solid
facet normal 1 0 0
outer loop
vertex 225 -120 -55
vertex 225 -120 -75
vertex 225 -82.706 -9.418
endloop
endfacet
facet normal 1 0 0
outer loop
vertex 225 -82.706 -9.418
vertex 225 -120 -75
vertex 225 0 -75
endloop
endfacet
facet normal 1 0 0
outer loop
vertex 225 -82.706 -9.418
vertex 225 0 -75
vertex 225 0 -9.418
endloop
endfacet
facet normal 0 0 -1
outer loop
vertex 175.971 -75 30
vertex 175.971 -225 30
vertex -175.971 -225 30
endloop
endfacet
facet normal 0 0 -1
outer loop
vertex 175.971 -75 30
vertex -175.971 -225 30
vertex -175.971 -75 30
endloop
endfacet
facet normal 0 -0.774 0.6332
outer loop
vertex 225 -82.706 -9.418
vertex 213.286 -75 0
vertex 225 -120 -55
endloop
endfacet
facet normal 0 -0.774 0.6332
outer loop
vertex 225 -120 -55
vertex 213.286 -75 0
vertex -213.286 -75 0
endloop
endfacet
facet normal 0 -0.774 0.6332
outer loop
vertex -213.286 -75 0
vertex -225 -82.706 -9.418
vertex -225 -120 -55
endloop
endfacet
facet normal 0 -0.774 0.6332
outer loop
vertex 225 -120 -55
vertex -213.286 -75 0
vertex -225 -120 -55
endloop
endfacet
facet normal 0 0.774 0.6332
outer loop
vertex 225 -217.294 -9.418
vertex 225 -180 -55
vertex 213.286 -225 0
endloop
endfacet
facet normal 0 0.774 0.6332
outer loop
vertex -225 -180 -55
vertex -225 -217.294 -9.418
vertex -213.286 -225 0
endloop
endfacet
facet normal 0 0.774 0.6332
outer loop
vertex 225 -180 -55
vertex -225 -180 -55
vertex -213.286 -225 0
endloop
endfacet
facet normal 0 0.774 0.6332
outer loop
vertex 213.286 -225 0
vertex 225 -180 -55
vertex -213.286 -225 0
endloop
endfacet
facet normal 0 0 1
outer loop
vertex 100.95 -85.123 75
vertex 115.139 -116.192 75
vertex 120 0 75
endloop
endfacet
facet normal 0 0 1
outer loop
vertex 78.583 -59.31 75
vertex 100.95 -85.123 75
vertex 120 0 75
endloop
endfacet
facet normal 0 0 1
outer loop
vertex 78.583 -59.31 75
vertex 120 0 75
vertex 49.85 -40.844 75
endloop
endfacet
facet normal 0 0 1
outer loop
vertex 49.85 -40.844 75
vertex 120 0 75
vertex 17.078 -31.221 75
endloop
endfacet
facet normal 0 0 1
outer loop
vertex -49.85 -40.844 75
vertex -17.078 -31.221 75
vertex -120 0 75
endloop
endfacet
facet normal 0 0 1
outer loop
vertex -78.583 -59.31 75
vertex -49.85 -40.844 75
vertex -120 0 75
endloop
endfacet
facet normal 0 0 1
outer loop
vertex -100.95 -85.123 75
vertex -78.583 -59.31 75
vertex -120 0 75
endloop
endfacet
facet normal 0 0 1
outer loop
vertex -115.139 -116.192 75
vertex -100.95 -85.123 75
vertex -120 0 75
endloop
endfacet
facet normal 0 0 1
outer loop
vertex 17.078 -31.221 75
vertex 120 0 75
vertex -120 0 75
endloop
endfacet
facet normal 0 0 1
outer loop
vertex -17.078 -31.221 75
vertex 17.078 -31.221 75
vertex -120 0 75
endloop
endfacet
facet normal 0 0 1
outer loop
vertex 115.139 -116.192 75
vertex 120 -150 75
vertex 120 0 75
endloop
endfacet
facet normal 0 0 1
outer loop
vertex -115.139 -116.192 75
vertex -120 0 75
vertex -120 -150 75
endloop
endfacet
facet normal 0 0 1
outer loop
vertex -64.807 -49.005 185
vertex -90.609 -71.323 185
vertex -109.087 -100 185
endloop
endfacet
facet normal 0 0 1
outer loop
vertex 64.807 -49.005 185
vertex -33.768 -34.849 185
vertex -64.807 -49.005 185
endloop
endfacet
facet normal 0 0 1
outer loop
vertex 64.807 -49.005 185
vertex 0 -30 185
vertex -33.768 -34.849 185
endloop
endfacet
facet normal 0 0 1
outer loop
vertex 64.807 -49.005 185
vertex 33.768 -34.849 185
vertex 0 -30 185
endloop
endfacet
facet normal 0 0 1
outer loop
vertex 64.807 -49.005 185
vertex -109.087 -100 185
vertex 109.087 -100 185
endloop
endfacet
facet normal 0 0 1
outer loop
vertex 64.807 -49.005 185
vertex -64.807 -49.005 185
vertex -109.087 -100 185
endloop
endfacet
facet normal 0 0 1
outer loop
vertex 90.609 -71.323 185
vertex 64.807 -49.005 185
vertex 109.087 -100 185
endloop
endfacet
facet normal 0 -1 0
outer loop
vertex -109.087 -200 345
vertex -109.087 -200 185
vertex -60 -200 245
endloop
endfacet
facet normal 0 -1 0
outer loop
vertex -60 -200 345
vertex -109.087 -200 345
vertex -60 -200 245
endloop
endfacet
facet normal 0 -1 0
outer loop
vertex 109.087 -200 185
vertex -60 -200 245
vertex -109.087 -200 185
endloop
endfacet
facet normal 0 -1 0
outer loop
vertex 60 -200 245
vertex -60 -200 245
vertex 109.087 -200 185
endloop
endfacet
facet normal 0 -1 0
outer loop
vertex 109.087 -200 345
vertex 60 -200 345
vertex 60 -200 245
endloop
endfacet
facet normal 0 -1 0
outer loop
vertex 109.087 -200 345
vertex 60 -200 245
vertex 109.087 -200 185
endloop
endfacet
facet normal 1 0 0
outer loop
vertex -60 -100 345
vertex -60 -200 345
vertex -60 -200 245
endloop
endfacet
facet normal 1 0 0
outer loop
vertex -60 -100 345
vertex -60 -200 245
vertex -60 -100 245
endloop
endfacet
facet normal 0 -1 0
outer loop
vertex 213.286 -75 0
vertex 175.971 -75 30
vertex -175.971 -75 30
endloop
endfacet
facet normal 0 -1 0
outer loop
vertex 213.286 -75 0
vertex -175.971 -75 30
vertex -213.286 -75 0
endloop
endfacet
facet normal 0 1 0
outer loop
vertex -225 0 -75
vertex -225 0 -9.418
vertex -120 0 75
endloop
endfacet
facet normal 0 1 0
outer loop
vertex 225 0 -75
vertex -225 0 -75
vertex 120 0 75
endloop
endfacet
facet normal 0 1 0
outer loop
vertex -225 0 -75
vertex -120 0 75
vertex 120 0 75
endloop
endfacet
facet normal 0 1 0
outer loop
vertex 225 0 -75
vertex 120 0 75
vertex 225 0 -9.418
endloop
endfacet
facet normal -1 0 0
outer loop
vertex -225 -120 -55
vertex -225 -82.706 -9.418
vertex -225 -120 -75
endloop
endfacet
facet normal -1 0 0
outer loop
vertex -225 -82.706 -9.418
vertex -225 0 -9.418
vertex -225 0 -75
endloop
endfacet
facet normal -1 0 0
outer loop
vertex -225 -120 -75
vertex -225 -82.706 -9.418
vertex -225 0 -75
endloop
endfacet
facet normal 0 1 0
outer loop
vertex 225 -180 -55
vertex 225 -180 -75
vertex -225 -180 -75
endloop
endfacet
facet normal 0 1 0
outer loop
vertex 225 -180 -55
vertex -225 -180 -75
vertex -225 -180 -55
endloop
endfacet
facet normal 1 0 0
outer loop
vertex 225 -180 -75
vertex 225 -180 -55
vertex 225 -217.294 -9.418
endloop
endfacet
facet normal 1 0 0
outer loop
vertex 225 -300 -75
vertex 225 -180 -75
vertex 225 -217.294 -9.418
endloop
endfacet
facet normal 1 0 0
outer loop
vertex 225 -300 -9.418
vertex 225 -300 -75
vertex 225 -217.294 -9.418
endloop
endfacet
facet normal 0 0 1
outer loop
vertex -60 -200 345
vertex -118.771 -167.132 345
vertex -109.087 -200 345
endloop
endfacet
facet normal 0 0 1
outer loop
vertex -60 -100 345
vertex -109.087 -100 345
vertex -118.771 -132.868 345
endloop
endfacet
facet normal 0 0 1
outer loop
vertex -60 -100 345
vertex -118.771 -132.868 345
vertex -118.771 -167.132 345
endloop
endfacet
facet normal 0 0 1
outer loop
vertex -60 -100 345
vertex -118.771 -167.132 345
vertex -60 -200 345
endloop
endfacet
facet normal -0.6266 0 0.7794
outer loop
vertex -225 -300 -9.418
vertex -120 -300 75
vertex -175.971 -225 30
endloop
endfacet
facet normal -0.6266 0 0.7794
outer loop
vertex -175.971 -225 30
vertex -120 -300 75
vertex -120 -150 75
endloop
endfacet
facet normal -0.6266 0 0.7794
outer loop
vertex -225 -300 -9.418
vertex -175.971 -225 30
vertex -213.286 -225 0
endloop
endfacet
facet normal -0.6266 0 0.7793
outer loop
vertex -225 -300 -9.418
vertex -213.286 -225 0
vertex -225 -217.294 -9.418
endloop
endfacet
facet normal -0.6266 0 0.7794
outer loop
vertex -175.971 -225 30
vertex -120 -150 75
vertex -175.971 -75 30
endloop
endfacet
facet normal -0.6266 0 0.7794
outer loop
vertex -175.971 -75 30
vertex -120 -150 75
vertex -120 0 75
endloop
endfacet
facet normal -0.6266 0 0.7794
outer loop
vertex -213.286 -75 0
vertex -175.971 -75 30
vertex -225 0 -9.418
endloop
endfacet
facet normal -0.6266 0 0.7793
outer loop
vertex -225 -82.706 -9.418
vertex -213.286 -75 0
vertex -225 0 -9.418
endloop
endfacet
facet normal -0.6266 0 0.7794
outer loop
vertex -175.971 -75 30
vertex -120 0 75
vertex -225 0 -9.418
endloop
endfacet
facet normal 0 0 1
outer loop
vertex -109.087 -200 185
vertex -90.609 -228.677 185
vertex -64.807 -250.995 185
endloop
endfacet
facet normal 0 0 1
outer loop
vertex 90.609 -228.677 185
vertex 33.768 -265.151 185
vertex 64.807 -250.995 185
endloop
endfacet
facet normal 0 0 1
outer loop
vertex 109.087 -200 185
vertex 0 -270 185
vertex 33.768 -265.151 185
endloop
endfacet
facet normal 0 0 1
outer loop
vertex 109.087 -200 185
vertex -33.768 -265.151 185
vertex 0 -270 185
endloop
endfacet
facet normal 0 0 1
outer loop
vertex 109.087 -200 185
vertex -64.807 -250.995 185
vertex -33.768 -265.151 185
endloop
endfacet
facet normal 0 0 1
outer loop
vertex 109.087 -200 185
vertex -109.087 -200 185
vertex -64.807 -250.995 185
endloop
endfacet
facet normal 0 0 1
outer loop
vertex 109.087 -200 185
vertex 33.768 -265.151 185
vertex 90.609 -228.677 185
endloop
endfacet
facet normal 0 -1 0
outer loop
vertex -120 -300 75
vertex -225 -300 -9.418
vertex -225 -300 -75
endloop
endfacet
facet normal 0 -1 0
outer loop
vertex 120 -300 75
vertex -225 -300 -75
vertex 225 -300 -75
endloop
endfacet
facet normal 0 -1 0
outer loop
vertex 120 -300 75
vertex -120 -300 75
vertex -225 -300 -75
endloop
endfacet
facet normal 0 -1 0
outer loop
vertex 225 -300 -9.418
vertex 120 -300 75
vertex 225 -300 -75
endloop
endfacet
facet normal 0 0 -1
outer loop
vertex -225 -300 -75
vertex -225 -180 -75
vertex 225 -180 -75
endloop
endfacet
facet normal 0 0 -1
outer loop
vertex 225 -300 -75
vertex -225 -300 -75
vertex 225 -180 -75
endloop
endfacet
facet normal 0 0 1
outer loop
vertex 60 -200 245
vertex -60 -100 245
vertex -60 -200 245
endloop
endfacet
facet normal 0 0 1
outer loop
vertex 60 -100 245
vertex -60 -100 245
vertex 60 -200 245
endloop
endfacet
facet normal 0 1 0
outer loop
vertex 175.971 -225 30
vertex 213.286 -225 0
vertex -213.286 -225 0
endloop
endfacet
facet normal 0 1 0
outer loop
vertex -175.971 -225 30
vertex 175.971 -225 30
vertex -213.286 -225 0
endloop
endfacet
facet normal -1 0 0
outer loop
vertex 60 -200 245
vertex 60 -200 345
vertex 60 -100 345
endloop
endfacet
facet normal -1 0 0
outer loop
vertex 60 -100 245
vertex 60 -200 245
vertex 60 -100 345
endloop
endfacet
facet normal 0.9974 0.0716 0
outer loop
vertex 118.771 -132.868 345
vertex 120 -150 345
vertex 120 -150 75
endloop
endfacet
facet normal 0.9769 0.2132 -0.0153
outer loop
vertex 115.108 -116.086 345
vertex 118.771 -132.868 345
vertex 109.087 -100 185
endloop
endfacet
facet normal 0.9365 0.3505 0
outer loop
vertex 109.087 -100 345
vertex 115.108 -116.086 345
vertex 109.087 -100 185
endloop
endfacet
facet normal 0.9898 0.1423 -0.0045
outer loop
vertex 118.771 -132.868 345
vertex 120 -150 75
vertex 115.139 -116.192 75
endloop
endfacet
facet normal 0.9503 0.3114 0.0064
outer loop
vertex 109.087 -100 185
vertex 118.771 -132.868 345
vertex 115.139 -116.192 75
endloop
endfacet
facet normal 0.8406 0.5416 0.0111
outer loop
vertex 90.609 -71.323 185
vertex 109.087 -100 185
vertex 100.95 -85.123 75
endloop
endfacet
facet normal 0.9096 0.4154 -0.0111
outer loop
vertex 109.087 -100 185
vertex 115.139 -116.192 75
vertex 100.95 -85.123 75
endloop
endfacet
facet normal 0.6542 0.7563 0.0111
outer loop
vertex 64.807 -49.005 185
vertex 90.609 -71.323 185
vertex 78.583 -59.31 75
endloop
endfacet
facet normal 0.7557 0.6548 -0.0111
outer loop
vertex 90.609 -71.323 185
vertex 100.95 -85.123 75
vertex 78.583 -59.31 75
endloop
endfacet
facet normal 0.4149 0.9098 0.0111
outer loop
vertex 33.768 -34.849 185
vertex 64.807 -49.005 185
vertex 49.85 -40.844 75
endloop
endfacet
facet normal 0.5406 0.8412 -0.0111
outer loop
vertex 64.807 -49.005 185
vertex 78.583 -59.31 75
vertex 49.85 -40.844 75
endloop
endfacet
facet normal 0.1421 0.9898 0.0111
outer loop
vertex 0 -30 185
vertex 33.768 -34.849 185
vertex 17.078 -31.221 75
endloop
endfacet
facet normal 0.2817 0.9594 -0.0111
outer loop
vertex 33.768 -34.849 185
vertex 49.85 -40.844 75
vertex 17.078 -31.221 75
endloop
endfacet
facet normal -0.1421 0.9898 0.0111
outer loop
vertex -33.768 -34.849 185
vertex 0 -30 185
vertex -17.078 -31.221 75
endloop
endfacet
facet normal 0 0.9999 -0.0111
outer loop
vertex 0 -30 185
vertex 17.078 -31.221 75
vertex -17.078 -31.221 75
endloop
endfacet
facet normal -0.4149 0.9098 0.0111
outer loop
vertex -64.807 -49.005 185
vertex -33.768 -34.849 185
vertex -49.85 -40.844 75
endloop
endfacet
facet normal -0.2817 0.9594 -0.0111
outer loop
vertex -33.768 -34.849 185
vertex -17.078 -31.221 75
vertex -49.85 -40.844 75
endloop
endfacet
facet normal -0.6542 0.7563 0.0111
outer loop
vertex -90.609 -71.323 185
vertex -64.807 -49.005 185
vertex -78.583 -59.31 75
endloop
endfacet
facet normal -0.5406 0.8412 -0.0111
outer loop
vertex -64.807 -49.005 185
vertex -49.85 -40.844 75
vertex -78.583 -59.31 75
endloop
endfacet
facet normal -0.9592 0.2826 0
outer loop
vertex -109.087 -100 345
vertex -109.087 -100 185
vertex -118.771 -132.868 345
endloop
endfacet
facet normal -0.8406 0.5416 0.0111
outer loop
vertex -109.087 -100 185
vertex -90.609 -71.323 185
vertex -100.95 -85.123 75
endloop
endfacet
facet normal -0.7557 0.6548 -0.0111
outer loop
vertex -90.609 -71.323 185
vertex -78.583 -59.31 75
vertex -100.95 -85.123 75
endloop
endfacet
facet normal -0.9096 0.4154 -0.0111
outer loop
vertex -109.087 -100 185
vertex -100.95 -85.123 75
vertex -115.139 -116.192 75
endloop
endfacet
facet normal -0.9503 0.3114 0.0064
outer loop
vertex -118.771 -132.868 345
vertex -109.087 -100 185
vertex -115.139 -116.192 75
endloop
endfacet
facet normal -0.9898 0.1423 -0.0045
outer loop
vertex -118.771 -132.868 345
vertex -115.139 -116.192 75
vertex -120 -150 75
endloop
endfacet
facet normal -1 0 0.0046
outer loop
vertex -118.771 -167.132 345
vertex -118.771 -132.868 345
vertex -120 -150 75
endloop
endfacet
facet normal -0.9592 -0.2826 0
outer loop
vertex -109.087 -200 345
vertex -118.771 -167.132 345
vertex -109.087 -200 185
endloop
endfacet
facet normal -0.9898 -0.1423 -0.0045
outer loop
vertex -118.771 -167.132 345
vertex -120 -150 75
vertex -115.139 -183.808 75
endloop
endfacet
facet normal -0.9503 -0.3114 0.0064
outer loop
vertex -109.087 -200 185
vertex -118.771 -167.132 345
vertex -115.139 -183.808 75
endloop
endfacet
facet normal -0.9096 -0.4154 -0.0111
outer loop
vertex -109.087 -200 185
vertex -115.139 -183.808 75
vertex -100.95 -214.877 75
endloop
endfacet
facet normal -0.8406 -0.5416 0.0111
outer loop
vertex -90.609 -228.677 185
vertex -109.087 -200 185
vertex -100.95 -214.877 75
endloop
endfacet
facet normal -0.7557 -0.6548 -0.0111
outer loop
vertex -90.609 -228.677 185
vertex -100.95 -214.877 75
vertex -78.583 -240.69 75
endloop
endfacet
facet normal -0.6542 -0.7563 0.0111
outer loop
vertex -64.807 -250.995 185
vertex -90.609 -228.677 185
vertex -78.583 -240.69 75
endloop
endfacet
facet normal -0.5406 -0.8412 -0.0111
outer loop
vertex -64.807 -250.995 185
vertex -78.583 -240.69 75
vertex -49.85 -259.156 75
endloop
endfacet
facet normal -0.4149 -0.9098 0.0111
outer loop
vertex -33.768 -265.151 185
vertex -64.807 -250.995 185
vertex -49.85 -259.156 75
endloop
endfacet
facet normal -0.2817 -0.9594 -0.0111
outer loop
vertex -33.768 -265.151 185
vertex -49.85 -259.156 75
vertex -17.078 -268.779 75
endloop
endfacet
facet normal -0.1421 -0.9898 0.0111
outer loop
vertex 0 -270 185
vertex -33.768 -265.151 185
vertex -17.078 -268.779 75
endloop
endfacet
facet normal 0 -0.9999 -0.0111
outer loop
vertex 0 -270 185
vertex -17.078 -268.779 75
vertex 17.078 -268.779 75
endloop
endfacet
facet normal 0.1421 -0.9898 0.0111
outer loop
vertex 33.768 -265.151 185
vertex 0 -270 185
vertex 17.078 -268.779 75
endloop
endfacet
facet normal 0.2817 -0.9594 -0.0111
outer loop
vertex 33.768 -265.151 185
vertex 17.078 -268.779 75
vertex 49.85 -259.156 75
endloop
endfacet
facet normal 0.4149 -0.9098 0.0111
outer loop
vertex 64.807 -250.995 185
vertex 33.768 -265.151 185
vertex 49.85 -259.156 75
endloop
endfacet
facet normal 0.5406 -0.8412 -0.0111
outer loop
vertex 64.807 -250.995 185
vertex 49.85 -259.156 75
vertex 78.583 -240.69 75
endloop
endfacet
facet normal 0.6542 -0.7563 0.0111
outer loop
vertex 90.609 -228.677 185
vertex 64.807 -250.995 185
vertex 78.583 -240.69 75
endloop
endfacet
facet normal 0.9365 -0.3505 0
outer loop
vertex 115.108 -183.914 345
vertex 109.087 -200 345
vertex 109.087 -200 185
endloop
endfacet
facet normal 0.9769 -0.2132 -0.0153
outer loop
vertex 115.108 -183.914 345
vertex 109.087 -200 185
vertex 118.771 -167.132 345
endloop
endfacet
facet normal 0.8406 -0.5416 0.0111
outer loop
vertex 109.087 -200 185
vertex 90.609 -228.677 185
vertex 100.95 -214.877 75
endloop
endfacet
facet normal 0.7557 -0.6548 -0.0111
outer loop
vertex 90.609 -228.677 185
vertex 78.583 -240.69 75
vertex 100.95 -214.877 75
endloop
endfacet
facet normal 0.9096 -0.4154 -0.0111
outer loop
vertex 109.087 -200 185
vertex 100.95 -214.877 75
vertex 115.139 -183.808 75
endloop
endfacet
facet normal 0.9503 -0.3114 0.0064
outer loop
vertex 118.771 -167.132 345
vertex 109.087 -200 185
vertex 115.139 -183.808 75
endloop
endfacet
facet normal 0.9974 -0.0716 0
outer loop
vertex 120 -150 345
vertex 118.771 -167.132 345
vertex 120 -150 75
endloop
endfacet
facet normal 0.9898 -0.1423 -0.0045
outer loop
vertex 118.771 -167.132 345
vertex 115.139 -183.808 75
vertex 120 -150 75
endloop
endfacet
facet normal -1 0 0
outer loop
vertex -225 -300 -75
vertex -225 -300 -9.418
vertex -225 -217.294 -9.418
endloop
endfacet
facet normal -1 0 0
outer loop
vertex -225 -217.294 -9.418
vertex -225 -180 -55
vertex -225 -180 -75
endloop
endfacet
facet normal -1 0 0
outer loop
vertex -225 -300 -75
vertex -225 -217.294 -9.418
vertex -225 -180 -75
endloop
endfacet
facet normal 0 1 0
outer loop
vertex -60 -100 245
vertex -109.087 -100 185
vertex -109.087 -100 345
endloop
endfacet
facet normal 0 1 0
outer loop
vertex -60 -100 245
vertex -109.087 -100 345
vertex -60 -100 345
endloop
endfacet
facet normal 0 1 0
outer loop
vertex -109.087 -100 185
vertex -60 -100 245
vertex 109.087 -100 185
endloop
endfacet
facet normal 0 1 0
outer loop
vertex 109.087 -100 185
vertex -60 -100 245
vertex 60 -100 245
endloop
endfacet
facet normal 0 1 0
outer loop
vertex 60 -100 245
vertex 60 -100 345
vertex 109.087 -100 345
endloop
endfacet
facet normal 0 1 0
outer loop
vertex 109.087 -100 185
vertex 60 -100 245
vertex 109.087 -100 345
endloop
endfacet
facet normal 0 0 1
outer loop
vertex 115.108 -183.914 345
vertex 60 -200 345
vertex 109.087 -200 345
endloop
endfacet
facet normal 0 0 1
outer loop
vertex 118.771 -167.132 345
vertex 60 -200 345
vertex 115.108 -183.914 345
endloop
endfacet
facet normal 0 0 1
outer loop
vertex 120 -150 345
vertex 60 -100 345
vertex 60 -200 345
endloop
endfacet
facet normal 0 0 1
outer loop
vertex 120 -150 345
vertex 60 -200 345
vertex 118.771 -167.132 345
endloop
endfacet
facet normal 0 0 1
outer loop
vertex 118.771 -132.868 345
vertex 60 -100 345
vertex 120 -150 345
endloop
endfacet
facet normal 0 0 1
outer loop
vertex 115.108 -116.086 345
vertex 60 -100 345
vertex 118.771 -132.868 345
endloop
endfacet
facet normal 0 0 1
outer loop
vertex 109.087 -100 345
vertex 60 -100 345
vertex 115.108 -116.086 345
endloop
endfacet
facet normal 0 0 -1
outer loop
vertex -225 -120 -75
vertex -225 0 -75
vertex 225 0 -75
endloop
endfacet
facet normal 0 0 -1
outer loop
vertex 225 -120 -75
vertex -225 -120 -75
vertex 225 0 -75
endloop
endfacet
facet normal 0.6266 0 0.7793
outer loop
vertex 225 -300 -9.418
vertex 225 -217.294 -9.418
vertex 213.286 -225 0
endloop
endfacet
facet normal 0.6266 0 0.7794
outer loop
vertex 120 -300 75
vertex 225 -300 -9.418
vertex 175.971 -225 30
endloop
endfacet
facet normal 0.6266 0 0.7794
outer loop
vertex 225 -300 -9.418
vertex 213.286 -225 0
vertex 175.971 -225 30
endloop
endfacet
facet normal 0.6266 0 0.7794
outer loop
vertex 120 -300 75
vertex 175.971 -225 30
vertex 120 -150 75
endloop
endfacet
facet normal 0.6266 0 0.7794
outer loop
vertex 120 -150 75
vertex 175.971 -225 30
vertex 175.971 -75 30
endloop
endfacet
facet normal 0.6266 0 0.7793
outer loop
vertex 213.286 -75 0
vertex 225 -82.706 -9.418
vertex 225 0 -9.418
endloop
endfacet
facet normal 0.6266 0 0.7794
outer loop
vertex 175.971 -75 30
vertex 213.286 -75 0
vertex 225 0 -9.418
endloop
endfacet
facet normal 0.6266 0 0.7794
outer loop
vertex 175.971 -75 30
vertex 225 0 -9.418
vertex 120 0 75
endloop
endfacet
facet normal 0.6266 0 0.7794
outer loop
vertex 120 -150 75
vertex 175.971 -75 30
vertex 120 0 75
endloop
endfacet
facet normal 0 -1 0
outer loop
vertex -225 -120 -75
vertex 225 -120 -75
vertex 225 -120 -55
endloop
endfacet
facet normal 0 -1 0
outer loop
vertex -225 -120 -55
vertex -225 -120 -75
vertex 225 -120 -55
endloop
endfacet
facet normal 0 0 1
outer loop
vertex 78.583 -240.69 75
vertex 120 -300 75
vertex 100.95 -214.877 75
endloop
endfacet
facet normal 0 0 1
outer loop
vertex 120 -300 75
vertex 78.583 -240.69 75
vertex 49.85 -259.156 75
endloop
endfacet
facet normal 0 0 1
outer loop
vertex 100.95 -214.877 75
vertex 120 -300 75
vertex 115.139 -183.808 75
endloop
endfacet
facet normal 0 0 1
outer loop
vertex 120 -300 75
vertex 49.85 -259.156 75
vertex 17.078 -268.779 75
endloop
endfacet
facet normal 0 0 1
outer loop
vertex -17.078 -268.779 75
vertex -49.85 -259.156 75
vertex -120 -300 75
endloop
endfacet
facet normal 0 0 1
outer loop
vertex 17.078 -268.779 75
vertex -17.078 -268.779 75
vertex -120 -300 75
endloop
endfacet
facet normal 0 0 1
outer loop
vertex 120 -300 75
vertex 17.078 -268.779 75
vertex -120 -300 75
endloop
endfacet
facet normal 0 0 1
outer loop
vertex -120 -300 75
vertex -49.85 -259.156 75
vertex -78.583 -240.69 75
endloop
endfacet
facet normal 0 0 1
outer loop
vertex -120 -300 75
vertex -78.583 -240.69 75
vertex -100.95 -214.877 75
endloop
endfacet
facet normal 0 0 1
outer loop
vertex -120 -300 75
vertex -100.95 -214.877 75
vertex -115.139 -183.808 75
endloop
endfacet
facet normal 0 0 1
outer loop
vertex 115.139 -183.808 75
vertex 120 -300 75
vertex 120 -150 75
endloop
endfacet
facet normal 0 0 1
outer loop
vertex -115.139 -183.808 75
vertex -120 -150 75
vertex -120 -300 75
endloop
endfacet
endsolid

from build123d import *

# Parameters (mm, degrees)
F1_DEPTH = 300
F2_R     = 120
F3_DEPTH = 270
F4_W     = 308.2067033212
F4_H     = 85.1061673835
F4_H_2   = 71.9743549824
F5_DEPTH = 160
F6_W     = 120
F6_H     = 100
F7_DEPTH = 100
F8_W     = 60
F8_H     = 40
F9_DEPTH = 450.001


with BuildPart() as f1:
    # F0 (on Front) → F1 (new body)
    with BuildSketch(Plane.XZ):
        Polygon((-225, -9.4181643799), (-225, -75), (225, -75), (225, -9.4181643799), (120, 75), (-120, 75), align=None)
    extrude(amount=F1_DEPTH)

    # F2 (on face) → F3 (join)
    with BuildSketch(Plane.XY.offset(75)):
        with Locations((0, -150)):
            Circle(F2_R)
    extrude(amount=F3_DEPTH)

    # F4 (on face) → F5 (cut)
    with BuildSketch(Plane.XY.offset(345)):
        with Locations((0, -57.4469163083)):
            Rectangle(F4_W, F4_H)
        with Locations((0, -235.9871774912)):
            Rectangle(F4_W, F4_H_2)
    extrude(amount=-F5_DEPTH, mode=Mode.SUBTRACT)

    # F6 (on face) → F7 (cut)
    with BuildSketch(Plane.XY.offset(345)):
        with Locations((0, -150)):
            Rectangle(F6_W, F6_H)
    extrude(amount=-F7_DEPTH, mode=Mode.SUBTRACT)

    # F8 (on face) → F9 (cut, through all)
    with BuildSketch(Plane(origin=(-225, 0, 0), x_dir=(0, -1, 0), z_dir=(-1, 0, 0))):
        with Locations((150, -75)):
            Rectangle(F8_W, F8_H)
        Polygon((75, 0), (120, -55), (180, -55), (225, 0), (225, 30), (75, 30), align=None)
    extrude(amount=-F9_DEPTH, mode=Mode.SUBTRACT)


solid = f1.part
